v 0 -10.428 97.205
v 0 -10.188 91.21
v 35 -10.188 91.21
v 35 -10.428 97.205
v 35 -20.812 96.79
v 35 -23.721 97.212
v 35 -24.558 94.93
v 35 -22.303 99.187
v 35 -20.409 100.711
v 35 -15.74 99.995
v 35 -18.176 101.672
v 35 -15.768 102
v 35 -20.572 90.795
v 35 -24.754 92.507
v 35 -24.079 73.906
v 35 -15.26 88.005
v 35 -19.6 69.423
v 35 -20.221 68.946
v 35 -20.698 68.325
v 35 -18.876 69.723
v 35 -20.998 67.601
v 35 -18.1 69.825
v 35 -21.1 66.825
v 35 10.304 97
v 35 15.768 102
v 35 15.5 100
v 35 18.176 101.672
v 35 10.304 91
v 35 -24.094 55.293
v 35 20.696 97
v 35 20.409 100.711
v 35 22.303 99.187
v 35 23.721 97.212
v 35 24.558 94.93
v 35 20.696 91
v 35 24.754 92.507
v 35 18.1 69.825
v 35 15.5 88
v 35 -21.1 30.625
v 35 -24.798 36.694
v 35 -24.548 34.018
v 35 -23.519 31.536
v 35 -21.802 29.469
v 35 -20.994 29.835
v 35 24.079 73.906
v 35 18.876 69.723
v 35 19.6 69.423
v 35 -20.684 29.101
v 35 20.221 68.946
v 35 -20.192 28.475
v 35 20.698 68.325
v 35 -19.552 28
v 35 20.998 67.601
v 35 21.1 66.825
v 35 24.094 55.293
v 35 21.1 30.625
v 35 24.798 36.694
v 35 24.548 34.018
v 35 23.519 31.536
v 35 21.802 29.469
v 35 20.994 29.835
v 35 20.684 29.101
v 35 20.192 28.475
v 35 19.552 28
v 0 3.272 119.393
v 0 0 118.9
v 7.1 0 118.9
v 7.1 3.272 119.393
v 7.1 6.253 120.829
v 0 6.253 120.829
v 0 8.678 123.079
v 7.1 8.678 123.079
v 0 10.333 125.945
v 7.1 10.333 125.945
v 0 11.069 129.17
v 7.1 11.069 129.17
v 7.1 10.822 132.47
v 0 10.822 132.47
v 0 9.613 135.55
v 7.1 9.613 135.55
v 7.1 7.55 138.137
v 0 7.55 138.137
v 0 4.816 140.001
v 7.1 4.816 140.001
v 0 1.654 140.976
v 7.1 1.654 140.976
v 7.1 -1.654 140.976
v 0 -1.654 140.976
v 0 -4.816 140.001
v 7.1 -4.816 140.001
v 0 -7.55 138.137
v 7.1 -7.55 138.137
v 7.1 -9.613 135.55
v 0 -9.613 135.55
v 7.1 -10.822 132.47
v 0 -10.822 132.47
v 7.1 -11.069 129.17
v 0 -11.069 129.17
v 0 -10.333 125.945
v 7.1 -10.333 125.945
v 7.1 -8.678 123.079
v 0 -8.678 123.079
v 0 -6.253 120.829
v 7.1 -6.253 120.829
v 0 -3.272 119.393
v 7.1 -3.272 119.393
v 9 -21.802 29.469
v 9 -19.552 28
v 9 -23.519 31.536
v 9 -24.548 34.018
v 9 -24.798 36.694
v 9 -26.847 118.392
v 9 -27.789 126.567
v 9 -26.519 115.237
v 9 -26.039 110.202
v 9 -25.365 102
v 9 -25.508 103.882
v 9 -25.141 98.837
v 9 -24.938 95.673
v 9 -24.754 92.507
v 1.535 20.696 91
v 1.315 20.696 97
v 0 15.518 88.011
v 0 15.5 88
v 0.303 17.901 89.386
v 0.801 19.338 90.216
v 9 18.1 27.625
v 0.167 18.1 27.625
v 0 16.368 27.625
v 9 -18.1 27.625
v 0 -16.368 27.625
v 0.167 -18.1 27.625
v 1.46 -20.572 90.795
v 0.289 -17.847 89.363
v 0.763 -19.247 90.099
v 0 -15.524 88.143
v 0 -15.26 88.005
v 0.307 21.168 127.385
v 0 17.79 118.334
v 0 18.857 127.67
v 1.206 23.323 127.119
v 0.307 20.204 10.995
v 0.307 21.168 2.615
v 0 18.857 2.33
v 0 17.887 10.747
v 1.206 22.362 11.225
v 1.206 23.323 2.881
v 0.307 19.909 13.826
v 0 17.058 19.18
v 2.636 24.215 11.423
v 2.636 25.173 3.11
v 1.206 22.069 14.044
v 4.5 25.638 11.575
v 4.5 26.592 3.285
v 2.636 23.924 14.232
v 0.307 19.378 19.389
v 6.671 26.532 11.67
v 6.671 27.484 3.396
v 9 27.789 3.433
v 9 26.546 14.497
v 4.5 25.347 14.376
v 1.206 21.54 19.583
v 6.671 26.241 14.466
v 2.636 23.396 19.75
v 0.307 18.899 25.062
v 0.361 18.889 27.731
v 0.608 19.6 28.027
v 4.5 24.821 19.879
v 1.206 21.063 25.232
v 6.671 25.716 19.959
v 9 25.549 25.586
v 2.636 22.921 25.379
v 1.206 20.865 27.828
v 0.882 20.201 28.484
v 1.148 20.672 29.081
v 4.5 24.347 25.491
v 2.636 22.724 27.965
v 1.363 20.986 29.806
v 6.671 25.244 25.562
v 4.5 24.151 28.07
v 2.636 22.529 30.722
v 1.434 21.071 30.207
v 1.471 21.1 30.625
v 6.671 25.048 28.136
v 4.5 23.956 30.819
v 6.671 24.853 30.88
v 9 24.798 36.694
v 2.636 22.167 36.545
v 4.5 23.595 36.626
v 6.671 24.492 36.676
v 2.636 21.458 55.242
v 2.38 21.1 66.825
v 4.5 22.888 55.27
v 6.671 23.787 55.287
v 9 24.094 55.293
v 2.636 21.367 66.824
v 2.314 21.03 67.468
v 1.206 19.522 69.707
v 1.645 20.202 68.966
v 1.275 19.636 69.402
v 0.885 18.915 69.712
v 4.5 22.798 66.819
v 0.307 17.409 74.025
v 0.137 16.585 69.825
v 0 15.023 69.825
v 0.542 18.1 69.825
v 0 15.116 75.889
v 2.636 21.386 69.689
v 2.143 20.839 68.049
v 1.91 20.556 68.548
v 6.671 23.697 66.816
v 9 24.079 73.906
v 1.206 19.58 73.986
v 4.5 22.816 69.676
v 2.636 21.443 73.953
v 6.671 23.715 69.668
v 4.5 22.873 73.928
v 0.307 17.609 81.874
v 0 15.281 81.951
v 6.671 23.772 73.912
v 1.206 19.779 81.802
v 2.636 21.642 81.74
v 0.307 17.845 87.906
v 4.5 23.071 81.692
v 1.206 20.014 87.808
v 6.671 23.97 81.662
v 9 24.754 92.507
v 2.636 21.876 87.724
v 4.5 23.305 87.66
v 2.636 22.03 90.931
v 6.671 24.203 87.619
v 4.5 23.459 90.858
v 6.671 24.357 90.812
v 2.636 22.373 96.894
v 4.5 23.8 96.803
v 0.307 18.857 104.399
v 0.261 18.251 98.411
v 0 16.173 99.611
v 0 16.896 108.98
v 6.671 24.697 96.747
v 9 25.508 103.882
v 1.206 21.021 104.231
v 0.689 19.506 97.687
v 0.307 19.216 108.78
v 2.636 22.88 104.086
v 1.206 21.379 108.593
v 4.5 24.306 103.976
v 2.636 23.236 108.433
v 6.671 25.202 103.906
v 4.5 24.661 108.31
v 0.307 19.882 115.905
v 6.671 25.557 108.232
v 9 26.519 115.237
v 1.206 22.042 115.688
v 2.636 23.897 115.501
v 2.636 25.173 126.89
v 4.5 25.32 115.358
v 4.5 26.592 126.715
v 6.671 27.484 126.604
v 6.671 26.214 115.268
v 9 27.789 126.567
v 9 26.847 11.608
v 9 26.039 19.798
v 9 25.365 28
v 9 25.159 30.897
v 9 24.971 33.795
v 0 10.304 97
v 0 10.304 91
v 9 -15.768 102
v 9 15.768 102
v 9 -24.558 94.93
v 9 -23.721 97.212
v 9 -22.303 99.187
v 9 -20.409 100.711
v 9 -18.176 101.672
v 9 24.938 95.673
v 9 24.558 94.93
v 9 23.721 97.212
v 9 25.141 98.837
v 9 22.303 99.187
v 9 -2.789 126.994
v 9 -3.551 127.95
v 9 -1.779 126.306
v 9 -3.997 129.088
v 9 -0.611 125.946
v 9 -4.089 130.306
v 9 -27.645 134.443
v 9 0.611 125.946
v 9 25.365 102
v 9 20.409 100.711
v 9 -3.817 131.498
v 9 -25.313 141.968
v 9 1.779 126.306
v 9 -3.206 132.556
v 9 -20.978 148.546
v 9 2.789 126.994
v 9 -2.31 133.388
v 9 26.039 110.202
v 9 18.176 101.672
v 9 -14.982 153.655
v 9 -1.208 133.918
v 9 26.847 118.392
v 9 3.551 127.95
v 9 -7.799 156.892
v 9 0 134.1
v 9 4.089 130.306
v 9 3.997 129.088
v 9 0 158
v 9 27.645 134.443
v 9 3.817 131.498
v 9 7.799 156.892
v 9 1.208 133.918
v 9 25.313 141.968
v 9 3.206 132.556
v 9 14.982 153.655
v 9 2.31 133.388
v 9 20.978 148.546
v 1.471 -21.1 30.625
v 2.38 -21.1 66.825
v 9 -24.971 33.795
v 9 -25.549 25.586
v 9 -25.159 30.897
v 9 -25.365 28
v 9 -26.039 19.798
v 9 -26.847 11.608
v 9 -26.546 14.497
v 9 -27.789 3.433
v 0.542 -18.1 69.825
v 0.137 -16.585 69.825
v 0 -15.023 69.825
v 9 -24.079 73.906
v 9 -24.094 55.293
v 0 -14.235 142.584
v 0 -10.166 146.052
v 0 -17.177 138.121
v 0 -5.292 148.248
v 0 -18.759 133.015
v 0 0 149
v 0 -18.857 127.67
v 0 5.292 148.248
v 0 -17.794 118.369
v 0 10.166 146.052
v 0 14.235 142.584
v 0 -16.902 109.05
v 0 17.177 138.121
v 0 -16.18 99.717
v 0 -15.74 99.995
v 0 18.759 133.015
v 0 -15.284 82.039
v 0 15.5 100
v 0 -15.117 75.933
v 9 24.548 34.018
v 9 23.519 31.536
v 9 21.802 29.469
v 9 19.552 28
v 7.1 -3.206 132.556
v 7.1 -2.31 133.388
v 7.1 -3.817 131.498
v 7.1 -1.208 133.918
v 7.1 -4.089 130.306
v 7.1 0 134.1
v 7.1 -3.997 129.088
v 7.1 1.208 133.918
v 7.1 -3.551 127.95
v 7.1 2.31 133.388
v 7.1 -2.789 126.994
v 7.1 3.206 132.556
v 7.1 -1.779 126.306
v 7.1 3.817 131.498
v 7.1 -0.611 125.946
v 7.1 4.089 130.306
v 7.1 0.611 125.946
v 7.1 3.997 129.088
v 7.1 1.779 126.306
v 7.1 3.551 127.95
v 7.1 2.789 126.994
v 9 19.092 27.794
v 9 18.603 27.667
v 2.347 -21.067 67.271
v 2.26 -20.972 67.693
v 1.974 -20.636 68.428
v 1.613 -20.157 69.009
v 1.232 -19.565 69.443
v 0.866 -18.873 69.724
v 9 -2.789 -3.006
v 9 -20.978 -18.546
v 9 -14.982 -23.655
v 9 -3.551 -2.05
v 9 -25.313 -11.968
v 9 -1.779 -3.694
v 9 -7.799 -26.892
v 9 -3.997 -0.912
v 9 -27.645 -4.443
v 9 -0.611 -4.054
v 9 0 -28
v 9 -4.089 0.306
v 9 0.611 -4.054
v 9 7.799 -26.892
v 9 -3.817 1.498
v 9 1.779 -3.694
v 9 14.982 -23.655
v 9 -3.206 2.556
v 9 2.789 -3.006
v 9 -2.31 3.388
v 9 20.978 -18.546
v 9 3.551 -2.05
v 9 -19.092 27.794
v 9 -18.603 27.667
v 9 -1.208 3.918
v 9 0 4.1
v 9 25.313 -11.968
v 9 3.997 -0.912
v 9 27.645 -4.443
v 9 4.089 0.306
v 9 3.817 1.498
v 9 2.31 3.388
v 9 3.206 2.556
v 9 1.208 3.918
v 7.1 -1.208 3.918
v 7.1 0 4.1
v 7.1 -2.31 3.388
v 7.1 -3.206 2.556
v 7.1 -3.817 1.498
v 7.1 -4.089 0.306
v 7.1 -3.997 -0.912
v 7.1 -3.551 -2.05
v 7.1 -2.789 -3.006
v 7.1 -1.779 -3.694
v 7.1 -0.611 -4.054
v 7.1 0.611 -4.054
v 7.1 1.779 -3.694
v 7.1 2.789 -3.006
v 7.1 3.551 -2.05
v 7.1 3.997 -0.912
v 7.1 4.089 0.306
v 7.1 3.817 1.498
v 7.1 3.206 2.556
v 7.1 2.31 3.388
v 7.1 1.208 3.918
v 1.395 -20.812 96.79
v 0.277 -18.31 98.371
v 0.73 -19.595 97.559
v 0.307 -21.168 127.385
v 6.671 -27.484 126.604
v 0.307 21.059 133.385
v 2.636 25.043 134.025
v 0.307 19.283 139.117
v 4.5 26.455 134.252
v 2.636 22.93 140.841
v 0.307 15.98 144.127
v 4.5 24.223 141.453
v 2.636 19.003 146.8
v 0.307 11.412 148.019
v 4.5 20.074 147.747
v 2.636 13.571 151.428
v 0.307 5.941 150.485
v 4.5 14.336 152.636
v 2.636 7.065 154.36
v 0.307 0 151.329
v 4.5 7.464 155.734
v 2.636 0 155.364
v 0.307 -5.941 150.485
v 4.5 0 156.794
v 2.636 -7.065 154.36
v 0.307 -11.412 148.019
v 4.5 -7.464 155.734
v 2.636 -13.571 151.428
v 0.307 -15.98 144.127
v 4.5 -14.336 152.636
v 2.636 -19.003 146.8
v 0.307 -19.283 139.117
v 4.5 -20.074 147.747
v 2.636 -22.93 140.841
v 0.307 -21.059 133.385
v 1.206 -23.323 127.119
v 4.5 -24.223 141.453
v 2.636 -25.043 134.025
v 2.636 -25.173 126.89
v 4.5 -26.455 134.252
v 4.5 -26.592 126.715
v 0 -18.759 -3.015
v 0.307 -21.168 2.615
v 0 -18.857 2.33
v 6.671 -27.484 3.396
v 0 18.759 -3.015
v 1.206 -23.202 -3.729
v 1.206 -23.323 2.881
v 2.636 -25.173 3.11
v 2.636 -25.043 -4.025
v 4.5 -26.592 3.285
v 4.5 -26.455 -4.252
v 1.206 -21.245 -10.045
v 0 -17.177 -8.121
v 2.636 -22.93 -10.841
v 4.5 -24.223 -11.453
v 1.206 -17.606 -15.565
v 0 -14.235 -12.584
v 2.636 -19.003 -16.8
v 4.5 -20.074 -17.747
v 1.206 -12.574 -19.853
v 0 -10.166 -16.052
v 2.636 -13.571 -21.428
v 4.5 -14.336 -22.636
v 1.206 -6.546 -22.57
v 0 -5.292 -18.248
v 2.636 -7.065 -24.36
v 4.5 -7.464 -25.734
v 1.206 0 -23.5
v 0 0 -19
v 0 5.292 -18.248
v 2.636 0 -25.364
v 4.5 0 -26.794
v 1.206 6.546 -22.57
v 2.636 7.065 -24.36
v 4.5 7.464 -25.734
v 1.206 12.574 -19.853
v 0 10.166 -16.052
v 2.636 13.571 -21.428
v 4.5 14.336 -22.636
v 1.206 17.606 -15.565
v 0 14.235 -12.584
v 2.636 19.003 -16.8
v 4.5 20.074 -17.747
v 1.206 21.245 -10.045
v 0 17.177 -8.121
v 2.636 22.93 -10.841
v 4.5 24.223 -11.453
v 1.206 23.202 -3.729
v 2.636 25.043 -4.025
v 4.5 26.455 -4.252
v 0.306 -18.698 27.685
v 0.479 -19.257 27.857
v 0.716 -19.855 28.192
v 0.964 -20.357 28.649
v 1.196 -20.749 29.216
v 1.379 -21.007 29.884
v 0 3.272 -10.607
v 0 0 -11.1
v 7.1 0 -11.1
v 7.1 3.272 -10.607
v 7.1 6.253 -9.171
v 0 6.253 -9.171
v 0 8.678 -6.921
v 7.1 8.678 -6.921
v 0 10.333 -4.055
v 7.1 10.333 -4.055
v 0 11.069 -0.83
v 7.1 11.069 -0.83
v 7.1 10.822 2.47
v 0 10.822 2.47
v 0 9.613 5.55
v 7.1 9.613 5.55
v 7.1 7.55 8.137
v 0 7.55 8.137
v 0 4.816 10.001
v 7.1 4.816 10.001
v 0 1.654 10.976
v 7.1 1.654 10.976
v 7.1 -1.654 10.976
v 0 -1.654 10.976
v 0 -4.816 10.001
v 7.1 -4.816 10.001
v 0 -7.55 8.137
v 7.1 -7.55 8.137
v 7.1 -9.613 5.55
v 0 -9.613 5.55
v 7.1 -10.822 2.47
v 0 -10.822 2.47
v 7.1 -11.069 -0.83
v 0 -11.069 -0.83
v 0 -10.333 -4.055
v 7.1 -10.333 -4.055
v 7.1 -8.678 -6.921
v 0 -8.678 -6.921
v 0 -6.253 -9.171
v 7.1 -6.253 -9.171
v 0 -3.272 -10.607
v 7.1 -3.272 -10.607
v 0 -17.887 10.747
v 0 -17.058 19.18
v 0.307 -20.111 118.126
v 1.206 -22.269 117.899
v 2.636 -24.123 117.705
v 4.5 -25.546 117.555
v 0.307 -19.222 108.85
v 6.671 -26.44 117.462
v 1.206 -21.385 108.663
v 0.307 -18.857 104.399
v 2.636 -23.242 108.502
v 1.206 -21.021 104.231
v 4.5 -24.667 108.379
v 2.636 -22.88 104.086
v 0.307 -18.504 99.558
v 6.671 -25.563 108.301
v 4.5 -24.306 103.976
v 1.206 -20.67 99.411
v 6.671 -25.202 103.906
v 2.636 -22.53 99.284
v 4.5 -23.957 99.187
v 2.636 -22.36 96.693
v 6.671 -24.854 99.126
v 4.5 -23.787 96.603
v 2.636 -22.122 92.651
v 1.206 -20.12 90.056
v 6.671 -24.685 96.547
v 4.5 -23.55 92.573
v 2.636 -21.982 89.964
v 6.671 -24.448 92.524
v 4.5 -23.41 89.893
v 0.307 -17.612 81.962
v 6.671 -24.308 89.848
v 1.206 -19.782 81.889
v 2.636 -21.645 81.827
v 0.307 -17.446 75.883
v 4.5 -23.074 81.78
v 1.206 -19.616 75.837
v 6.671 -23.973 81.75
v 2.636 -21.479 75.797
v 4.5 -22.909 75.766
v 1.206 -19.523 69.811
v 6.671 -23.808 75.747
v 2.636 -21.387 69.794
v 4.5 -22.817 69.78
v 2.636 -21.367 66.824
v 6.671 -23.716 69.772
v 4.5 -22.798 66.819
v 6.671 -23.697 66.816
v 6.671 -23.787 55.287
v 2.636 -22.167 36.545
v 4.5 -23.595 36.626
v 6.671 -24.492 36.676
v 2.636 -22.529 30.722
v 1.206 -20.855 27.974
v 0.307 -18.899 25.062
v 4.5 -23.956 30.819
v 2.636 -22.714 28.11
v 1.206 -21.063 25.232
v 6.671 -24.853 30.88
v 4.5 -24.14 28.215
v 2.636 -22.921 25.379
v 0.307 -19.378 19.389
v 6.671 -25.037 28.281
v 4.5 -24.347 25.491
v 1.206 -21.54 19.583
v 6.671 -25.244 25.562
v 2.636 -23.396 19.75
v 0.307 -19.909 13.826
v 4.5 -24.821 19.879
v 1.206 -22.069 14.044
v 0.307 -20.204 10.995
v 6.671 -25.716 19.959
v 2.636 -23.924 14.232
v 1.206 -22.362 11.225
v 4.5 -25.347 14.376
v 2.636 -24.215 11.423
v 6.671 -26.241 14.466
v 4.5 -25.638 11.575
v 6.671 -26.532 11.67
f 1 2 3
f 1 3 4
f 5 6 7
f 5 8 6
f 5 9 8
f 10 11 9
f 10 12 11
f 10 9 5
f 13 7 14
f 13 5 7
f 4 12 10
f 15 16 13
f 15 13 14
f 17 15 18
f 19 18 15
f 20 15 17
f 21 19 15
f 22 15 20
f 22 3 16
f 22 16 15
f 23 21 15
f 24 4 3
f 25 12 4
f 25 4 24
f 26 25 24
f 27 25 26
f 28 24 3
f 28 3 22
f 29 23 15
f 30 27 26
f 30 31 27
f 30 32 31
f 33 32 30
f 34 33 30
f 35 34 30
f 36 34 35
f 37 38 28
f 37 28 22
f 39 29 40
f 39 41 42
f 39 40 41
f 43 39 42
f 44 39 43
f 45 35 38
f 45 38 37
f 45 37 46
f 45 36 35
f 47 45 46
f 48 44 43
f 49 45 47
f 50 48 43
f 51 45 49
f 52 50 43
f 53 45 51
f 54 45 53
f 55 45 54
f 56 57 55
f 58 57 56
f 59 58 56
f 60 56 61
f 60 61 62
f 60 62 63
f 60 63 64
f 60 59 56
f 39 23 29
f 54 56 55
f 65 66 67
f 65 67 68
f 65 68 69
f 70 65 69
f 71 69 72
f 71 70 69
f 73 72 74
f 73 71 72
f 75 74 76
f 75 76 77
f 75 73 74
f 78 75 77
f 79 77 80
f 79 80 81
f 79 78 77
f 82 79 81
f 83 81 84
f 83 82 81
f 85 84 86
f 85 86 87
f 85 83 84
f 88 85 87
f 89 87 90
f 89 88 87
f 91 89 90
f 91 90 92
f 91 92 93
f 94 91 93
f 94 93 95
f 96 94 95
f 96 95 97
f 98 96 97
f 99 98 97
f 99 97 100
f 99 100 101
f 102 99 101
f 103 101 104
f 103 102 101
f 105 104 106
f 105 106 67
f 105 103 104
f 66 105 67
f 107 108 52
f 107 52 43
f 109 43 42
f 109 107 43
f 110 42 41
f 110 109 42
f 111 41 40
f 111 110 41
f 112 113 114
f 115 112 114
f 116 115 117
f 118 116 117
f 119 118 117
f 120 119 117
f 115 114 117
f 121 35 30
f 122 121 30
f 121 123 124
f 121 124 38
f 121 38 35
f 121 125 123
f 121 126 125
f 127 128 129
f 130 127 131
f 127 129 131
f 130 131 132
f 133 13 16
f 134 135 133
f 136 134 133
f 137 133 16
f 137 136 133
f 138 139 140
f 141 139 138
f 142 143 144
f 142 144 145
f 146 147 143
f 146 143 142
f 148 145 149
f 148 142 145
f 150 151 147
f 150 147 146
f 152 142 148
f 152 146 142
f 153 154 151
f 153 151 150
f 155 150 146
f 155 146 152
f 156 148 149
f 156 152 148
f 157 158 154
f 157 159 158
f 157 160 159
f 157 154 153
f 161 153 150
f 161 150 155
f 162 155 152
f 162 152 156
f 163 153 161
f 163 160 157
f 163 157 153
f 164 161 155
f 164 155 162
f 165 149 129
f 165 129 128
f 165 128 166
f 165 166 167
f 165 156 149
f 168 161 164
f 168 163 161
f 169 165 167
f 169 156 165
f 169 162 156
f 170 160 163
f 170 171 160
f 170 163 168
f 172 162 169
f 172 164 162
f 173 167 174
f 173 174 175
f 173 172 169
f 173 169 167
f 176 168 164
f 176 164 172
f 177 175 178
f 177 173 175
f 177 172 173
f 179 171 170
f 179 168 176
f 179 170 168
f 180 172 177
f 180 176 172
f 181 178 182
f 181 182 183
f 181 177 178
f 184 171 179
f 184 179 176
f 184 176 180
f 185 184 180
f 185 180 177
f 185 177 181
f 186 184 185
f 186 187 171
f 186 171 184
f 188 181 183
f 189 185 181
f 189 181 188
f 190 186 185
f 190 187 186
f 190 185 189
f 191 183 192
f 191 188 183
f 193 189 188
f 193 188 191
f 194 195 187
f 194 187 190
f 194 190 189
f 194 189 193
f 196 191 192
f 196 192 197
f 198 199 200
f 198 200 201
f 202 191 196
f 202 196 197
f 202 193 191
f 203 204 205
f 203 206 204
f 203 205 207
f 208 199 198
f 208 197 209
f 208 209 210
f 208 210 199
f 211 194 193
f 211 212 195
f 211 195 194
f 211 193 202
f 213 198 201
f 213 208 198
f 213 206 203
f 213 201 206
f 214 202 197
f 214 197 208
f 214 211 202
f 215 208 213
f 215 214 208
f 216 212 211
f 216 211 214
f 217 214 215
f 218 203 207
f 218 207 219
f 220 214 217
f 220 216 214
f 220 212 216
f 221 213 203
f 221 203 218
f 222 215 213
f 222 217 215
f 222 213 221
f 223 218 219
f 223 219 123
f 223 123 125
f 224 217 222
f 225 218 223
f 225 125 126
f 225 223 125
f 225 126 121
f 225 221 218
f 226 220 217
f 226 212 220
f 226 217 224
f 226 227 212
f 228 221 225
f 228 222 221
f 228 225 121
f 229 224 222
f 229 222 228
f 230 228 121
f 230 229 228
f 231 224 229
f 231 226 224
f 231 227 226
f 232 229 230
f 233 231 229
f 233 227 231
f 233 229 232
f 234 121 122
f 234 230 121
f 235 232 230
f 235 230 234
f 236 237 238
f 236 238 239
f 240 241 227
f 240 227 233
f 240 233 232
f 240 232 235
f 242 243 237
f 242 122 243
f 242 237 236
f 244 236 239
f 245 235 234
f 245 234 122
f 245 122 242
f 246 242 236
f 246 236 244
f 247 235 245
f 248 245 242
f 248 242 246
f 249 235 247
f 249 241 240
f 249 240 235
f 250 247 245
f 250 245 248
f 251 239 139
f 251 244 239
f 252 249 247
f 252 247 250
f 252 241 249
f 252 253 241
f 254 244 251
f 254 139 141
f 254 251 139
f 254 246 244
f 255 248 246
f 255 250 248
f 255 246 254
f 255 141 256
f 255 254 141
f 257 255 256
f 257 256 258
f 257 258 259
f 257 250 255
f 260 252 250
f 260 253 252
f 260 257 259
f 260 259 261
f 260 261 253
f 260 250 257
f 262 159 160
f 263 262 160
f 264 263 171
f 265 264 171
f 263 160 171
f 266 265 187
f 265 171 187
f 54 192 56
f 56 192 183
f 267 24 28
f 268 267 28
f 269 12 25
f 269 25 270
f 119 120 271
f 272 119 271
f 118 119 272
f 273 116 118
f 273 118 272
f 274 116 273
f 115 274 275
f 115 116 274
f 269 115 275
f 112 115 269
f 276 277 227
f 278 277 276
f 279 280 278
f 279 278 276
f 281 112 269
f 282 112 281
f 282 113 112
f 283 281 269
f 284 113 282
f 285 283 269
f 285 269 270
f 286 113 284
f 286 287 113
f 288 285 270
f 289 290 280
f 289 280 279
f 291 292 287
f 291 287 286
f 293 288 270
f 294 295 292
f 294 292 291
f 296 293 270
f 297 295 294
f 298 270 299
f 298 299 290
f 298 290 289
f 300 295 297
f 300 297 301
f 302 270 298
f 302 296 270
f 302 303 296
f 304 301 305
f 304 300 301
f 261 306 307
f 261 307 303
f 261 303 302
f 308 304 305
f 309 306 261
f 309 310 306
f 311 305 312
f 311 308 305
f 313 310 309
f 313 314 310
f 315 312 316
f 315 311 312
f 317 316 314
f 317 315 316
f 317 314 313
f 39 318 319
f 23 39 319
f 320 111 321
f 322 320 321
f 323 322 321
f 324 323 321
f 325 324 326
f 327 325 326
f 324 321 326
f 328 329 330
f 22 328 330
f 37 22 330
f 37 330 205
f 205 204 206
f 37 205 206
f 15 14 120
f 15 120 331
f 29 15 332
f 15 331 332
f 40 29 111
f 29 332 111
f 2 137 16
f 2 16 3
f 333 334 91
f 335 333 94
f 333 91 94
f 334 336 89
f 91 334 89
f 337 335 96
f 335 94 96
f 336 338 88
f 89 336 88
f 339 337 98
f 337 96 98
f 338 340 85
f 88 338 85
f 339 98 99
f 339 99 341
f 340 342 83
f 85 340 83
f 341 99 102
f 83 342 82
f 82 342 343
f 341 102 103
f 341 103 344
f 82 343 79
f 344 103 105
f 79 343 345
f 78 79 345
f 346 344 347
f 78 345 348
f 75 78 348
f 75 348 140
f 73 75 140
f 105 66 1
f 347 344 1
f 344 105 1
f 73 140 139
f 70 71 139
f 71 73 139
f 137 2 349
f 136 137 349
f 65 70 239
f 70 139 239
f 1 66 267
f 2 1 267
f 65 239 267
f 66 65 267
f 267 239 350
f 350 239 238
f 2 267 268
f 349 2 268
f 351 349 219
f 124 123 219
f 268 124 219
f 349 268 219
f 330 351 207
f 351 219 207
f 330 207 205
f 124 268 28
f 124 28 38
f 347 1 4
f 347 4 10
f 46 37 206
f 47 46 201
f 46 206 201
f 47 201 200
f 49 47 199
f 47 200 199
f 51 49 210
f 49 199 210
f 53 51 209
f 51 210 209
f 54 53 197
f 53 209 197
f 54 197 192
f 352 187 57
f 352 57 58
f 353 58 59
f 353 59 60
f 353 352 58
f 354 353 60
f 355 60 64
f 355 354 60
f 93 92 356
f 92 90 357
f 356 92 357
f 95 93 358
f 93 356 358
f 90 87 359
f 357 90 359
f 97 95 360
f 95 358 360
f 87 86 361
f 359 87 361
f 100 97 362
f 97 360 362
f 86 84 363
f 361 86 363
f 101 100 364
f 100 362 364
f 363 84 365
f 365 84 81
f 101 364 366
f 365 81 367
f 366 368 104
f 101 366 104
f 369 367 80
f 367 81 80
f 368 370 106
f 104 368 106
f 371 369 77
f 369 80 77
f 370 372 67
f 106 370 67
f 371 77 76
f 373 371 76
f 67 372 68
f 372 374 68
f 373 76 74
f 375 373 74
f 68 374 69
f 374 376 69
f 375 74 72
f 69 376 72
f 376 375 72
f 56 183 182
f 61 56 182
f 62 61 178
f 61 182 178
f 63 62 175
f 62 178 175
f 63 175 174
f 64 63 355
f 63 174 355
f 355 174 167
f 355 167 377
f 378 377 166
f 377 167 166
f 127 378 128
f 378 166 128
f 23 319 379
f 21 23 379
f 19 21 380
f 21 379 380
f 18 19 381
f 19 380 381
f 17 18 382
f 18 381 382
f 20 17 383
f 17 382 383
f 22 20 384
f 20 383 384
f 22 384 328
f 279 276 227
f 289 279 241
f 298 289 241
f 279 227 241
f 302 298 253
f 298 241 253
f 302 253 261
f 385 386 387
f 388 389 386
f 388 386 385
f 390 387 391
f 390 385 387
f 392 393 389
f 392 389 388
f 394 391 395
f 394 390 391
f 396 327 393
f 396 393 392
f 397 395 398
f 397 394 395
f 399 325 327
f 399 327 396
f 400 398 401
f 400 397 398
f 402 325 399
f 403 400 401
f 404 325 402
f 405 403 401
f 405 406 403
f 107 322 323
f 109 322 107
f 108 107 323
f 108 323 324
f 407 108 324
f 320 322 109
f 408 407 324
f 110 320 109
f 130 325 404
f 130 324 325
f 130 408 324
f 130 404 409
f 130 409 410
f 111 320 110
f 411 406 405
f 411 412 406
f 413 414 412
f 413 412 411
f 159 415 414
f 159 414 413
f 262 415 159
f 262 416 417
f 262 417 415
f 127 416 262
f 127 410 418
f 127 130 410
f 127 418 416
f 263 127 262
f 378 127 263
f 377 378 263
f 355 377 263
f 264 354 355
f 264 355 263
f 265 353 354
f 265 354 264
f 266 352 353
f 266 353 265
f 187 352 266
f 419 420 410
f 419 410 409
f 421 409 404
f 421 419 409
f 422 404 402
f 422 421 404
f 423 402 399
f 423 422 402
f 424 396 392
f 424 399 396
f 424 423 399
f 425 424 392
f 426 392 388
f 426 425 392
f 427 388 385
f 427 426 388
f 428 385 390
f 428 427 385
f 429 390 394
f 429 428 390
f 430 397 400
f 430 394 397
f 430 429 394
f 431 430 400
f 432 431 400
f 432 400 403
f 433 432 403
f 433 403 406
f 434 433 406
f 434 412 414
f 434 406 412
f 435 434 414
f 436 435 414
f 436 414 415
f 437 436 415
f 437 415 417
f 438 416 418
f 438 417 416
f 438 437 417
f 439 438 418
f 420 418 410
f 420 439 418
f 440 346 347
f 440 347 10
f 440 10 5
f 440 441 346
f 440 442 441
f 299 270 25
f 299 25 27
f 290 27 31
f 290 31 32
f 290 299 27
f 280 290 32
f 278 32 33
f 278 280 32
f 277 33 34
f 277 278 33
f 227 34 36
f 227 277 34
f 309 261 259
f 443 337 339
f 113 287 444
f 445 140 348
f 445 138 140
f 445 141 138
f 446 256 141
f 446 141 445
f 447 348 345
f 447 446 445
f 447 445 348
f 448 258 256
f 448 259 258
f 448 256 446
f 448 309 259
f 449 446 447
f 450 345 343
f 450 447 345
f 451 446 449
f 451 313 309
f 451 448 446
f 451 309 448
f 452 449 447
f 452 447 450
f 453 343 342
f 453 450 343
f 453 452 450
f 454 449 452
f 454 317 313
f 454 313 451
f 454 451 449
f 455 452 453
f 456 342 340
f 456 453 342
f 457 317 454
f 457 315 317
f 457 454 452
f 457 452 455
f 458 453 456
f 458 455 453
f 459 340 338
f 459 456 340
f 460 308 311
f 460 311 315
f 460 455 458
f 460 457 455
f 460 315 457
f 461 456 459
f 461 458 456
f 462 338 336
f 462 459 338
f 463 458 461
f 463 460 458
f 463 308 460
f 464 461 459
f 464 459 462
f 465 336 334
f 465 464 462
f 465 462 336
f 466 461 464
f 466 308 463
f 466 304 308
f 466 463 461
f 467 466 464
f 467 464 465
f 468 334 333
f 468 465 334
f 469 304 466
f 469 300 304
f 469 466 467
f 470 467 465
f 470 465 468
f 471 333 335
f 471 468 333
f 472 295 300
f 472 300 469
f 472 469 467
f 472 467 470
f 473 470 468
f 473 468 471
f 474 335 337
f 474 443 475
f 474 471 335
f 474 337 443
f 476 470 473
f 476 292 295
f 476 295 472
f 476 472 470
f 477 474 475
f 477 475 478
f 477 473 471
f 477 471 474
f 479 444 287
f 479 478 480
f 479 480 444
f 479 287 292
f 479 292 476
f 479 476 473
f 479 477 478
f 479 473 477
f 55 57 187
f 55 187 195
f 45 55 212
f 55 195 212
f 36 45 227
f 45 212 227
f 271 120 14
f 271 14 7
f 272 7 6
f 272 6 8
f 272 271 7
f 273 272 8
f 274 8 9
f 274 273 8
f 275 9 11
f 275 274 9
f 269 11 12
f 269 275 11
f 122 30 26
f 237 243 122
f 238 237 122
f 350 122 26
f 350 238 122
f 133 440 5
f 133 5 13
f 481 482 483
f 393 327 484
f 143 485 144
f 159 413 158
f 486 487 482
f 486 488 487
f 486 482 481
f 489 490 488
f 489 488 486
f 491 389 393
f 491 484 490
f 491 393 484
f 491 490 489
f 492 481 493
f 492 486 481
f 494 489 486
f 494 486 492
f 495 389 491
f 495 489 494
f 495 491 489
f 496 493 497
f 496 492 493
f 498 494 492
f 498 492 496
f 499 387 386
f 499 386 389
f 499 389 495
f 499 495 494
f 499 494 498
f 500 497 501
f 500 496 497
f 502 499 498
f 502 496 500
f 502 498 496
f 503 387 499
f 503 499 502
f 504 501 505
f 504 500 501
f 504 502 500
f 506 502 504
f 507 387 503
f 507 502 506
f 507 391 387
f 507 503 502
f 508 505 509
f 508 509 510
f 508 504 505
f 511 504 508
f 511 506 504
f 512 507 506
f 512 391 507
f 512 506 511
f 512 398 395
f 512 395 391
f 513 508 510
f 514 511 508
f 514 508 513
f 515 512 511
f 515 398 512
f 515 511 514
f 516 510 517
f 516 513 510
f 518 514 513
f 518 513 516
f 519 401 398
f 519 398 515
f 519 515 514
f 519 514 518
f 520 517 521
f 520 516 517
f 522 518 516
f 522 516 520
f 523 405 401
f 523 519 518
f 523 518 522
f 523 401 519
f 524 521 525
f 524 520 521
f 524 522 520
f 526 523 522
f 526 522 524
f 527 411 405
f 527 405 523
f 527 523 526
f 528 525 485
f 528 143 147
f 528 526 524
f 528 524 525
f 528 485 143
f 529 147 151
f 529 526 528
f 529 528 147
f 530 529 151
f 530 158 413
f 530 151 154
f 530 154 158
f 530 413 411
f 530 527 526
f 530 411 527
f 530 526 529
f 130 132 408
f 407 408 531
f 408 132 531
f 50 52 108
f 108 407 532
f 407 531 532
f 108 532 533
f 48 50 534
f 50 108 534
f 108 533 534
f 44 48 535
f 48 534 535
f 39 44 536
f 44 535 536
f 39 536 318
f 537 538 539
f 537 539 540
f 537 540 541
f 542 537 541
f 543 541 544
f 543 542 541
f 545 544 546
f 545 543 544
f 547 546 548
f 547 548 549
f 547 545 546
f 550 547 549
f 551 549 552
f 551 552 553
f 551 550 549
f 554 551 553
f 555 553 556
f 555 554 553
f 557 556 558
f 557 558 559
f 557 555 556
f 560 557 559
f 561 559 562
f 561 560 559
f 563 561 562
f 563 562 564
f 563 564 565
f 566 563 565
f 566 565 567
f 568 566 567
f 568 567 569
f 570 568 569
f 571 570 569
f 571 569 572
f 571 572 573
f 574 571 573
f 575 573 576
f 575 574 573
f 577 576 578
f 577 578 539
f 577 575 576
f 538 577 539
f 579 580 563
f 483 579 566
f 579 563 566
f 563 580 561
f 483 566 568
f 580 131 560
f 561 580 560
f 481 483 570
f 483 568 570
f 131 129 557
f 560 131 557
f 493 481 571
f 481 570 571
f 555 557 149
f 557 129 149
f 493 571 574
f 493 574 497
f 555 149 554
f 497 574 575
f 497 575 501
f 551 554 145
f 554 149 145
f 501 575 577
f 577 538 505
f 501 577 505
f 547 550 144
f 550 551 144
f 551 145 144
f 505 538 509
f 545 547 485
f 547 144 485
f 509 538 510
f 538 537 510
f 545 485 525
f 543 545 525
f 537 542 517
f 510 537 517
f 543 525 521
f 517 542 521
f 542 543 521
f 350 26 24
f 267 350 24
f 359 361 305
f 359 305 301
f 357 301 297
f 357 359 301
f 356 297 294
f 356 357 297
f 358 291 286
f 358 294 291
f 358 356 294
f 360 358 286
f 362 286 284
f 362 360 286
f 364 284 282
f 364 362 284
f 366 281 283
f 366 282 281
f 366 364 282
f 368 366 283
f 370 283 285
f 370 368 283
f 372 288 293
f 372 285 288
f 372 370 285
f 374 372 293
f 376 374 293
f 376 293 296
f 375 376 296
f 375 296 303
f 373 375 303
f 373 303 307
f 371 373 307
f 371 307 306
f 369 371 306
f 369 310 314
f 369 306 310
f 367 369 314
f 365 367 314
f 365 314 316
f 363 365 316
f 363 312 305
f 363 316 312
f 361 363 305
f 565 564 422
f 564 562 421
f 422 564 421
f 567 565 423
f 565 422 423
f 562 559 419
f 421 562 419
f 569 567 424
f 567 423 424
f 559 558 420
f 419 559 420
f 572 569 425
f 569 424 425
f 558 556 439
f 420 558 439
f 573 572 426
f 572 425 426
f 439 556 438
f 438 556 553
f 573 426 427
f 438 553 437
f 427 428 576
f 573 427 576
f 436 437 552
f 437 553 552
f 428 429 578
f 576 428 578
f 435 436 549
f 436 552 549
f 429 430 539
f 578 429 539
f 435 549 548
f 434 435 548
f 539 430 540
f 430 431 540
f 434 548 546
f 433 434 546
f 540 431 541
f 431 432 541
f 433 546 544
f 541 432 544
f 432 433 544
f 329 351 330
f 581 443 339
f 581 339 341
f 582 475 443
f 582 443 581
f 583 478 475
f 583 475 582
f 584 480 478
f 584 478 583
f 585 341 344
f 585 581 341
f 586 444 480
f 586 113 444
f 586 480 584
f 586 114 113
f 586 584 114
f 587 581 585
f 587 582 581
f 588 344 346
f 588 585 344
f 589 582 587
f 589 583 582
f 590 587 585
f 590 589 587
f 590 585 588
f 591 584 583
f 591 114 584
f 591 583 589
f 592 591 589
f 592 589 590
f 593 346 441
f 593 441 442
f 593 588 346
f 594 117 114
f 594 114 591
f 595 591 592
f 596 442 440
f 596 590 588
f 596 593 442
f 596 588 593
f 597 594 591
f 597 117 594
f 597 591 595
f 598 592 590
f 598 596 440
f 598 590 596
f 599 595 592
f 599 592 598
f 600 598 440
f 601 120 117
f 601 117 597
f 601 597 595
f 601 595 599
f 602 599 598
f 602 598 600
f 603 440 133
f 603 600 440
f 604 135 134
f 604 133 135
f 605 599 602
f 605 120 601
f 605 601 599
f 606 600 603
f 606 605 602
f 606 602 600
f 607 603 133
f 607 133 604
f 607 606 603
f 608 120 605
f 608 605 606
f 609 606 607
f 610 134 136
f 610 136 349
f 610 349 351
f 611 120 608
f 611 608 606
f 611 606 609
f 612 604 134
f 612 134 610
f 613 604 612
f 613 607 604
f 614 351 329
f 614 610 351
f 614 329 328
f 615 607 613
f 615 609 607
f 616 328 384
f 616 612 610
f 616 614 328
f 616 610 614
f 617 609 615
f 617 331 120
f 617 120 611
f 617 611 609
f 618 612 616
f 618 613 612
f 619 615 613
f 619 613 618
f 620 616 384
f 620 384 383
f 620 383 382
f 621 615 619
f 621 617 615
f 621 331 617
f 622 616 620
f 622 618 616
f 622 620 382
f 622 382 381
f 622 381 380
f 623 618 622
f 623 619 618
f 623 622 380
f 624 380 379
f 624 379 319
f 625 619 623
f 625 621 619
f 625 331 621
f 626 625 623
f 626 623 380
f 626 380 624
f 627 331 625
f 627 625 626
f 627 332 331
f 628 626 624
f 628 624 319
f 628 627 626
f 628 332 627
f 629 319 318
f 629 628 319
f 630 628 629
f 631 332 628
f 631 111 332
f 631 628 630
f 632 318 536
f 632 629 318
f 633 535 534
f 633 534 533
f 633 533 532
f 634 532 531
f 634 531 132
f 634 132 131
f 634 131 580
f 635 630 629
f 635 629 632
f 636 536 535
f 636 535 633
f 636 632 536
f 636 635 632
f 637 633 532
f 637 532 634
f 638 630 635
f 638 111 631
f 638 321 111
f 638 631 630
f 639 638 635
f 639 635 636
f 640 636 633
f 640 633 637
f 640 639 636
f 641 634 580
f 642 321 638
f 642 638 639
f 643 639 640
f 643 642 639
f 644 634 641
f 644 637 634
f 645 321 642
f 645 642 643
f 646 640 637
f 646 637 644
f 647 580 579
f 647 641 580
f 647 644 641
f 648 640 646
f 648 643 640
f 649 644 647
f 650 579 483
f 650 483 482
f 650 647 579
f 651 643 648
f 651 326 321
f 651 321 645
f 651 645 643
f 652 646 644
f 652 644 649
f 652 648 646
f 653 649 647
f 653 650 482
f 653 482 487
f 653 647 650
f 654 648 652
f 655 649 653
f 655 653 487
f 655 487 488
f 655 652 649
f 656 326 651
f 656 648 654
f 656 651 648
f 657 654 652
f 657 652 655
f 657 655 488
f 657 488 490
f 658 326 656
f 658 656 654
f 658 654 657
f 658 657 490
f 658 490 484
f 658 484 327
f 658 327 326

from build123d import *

# Parameters (mm, degrees)
BOSS_EXTRUDE1_DEPTH     = 35
CUT_EXTRUDE1_DEPTH      = 165.23458831805192
CUT_EXTRUDE1_DEPTH_BACK = 165.23458831805192
CUT_EXTRUDE2_DEPTH      = 165.23458831805192
CUT_EXTRUDE3_DEPTH      = 165.23458831805192
CUT_EXTRUDE4_REACH      = 166.235
SKETCH7_R               = 4.1
SKETCH7_R_2             = 4.099999999999986
SKETCH7_3_R             = 11.1
CUT_EXTRUDE5_DEPTH      = 7.1
FILLET1_R               = 9
FILLET2_START           = 9
FILLET2_DEPTH           = 26


with BuildPart() as part:
    # Sketch1 → Boss-Extrude1 (new body)
    with BuildSketch(Plane(origin=(0, 0, 0), x_dir=(0, 0, -1), z_dir=(1, 0, 0))):
        with BuildLine():
            ThreePointArc((-3.4331525583588727, 27.788729073331762), (-20.97770568525129, 18.545507924642443), (-28, 3.43e-15))
            Line((-28, 0), (28, 0))
            ThreePointArc((28, 0), (18.545507924642447, 20.977705685251287), (-3.4331525583588727, 27.788729073331762))
        make_face()
        with BuildLine():
            Line((28, 0), (-28, 0))
            ThreePointArc((-28, 3.43e-15), (-20.977705685251298, -18.545507924642436), (-3.433152558358892, -27.78872907333176))
            ThreePointArc((-3.433152558358892, -27.78872907333176), (18.545507924642436, -20.977705685251298), (28, -6.86e-15))
        make_face()
        with BuildLine():
            ThreePointArc((-126.56684744164114, 27.788729073331766), (-109.02229431474872, 18.54550792464245), (-102, 0))
            Line((-102, 0), (-28, 0))
            ThreePointArc((-28, 3.43e-15), (-20.97770568525129, 18.545507924642443), (-3.4331525583588727, 27.788729073331762))
            ThreePointArc((-3.433152558358863, 27.788729073331695), (-65, 23.999999999999602), (-126.56684744164116, 27.788729073331638))
        make_face()
        with BuildLine():
            Line((-28, 0), (-102, 0))
            ThreePointArc((-102, -6.86e-15), (-109.0222943147487, -18.545507924642447), (-126.56684744164114, -27.788729073331766))
            ThreePointArc((-126.56684744164116, -27.788729073331638), (-65, -23.999999999999602), (-3.433152558358863, -27.788729073331695))
            ThreePointArc((-3.433152558358892, -27.78872907333176), (-20.977705685251298, -18.545507924642436), (-28, 3.43e-15))
        make_face()
        with BuildLine():
            ThreePointArc((-126.56684744164114, 27.788729073331766), (-148.54550792464244, 20.977705685251287), (-158, 3.43e-15))
            Line((-158, 0), (-102, 0))
            ThreePointArc((-102, 0), (-109.02229431474872, 18.54550792464245), (-126.56684744164114, 27.788729073331766))
        make_face()
        with BuildLine():
            Line((-102, 0), (-158, 0))
            ThreePointArc((-158, 3.43e-15), (-148.54550792464244, -20.97770568525128), (-126.56684744164114, -27.788729073331766))
            ThreePointArc((-126.56684744164114, -27.788729073331766), (-109.0222943147487, -18.545507924642447), (-102, -6.86e-15))
        make_face()
    extrude(amount=BOSS_EXTRUDE1_DEPTH)

    # Sketch4 → Cut-Extrude1 (cut, two sides: drawn at the far end of the back side and taken through both)
    with BuildSketch(Plane(origin=(0, 0, 0), x_dir=(1, 0, 0), z_dir=(0, 1, 0)).offset(-CUT_EXTRUDE1_DEPTH_BACK)):
        Polygon((8.999999999999998, 27.999999999999996), (61, 27.999999999999996), (61, -28.000000000000004), (9.000000000000005, -28.000000000000004), align=None)
        Polygon((60.999999999999986, -157.99999999999997), (60.99999999999993, -101.99999999999999), (8.999999999999956, -101.99999999999999), (8.99999999999997, -157.99999999999997), align=None)
    extrude(amount=CUT_EXTRUDE1_DEPTH + CUT_EXTRUDE1_DEPTH_BACK, mode=Mode.SUBTRACT)

    # Sketch6 → Cut-Extrude2 (cut, through all)
    with BuildSketch(Plane(origin=(0, 0, 0), x_dir=(0, 0, -1), z_dir=(1, 0, 0))):
        with BuildLine():
            Line((-30.624999999999996, -21.1), (-66.82499999999999, -21.100000000000005))
            ThreePointArc((-66.82499999999999, -21.100000000000005), (-68.94632034355963, -20.221320343559647), (-69.825, -18.100000000000005))
            Line((-69.825, -18.100000000000005), (-69.825, 18.099999999999998))
            ThreePointArc((-69.825, 18.099999999999998), (-68.94632034355963, 20.22132034355964), (-66.82499999999999, 21.099999999999998))
            Line((-66.82499999999999, 21.099999999999998), (-30.624999999999996, 21.1))
            ThreePointArc((-30.624999999999996, 21.1), (-28.503679656440355, 20.221320343559643), (-27.624999999999996, 18.1))
            Line((-27.624999999999996, 18.1), (-27.624999999999996, -18.1))
            ThreePointArc((-27.624999999999996, -18.1), (-28.503679656440355, -20.221320343559643), (-30.624999999999996, -21.1))
        make_face()
    extrude(amount=CUT_EXTRUDE2_DEPTH, mode=Mode.SUBTRACT)

    # Sketch8 → Cut-Extrude3 (cut, through all)
    with BuildSketch(Plane(origin=(0, 0, 0), x_dir=(0, 0, -1), z_dir=(1, 0, 0))):
        Polygon((-99.99999999999986, 15.499999999999991), (-96.9999999999999, 10.303847577293476), (-91.00000000000006, 10.303847577293476), (-88.00000000000014, 15.500000000000032), (-91.00000000000013, 20.696152422706533), (-96.99999999999999, 20.69615242270647), align=None)
        Polygon((-99.99521646144645, -15.739540352344857), (-96.7901602003611, -20.811779932971724), (-90.79494373891465, -20.57223958062687), (-88.00478353855354, -15.26045964765515), (-91.20983979963889, -10.188220067028302), (-97.20505626108536, -10.427760419373156), align=None)
    extrude(amount=CUT_EXTRUDE3_DEPTH, mode=Mode.SUBTRACT)

    # Sketch7 → Cut-Extrude4 (cut, up to next)
    with BuildSketch(Plane(origin=(0, 0, 0), x_dir=(0, 0, -1), z_dir=(1, 0, 0)), mode=Mode.PRIVATE) as cut_extrude4_sk1:
        with Locations(Location((0, 0, 0), (0, 0, 180))):
            Circle(SKETCH7_R)
    cut_extrude4_tool1 = extrude(cut_extrude4_sk1.sketch, amount=CUT_EXTRUDE4_REACH, mode=Mode.PRIVATE) & part.part
    # Sketch7 → Cut-Extrude4 (cut, up to next)
    with BuildSketch(Plane(origin=(0, 0, 0), x_dir=(0, 0, -1), z_dir=(1, 0, 0)), mode=Mode.PRIVATE) as cut_extrude4_sk2:
        with Locations(Location((-130, 0, 0), (0, 0, 180))):
            Circle(SKETCH7_R_2)
    cut_extrude4_tool2 = extrude(cut_extrude4_sk2.sketch, amount=CUT_EXTRUDE4_REACH, mode=Mode.PRIVATE) & part.part
    add(cut_extrude4_tool1.solids().sort_by_distance((0, 0, 0))[0], mode=Mode.SUBTRACT)
    add(cut_extrude4_tool2.solids().sort_by_distance((0, 0, 130))[0], mode=Mode.SUBTRACT)

    # Sketch7<3> → Cut-Extrude5 (cut)
    with BuildSketch(Plane(origin=(0, 0, 0), x_dir=(0, 0, -1), z_dir=(1, 0, 0))):
        Circle(SKETCH7_3_R)
        with Locations((-130, 0)):
            Circle(SKETCH7_3_R)
    extrude(amount=CUT_EXTRUDE5_DEPTH, mode=Mode.SUBTRACT)

    # Fillet1
    # the kernel refuses this fillet: 9 mm, written as the material it takes off along each edge
    with BuildSketch(Plane(origin=(0, -7.11e-15, 130), x_dir=(0, 0.9924546097618487, -0.12261259136995861), z_dir=(0, -0.12261259136995861, -0.9924546097618487))) as fillet1_piece_1:
        with BuildLine():
            CenterArc((28 - FILLET1_R, FILLET1_R), FILLET1_R, 270, 89.99999999999999)
            Line((28, FILLET1_R), (28, 0))
            Line((28, 0), (28 - FILLET1_R, 0))
        make_face()
    revolve(axis=Axis((0, -7.11e-15, 130), (1, 0, 0)), revolution_arc=194.0858135076888, mode=Mode.SUBTRACT)
    with BuildSketch(Plane(origin=(0, 526.1249999999663, 65.00000000000024), x_dir=(0, -0.9924546097618476, -0.12261259136996856), z_dir=(0, 0.12261259136996856, -0.9924546097618476))) as fillet1_piece_2:
        with BuildLine():
            CenterArc((502.12499999996675 + FILLET1_R, -FILLET1_R), FILLET1_R, 90, 90)
            Line((502.12499999996675 + FILLET1_R, 1.78e-15), (502.12499999996675, 0))
            Line((502.12499999996675, 0), (502.12499999996675, -FILLET1_R))
        make_face()
    revolve(axis=Axis((0, 526.1249999999663, 65.00000000000024), (-1, 0, 0)), revolution_arc=14.085813507689899, mode=Mode.SUBTRACT)
    with BuildSketch(Plane(origin=(0, 1.78e-15, -1.78e-15), x_dir=(0, -0.9924546097618486, 0.12261259136995943), z_dir=(0, 0.12261259136995943, 0.9924546097618486))) as fillet1_piece_3:
        with BuildLine():
            CenterArc((28 - FILLET1_R, FILLET1_R), FILLET1_R, 270, 90)
            Line((27.999999999999996, FILLET1_R), (28, 0))
            Line((28, 0), (28 - FILLET1_R, 0))
        make_face()
    revolve(axis=Axis((0, 1.78e-15, -1.78e-15), (1, 0, 0)), revolution_arc=194.0858135076889, mode=Mode.SUBTRACT)
    with BuildSketch(Plane(origin=(0, -526.1249999999588, 65.00000000000026), x_dir=(0, 0.9924546097618475, 0.12261259136996942), z_dir=(0, -0.12261259136996942, 0.9924546097618475))) as fillet1_piece_4:
        with BuildLine():
            CenterArc((502.1249999999594 + FILLET1_R, -FILLET1_R), FILLET1_R, 90, 90)
            Line((502.1249999999594 + FILLET1_R, 1.78e-15), (502.1249999999594, 0))
            Line((502.1249999999594, 0), (502.1249999999594, -FILLET1_R))
        make_face()
    revolve(axis=Axis((0, -526.1249999999588, 65.00000000000026), (-1, 0, 0)), revolution_arc=14.085813507690109, mode=Mode.SUBTRACT)

    # Fillet2: read off the stored shape, not the designer's step
    # Fillet2 outline → Fillet2 (cut)
    with BuildSketch(Plane.YZ.offset(FILLET2_START)):
        with BuildLine():
            ThreePointArc((25.365061881, 28), (25.062921918, 32.34560469), (24.798492486, 36.693666988))
            ThreePointArc((24.798492486, 36.693666988), (23.518514891, 31.536360045), (19.552368755, 28))
            Line((19.552368755, 28), (25.365061881, 28))
        make_face()
        with BuildLine():
            Line((25.365061881, 102), (15.767511934, 102))
            ThreePointArc((15.767511934, 102), (22.303461396, 99.187193599), (24.753997417, 92.506969919))
            ThreePointArc((24.753997417, 92.506969919), (25.037048655, 97.254932057), (25.365061881, 102))
        make_face()
        with BuildLine():
            ThreePointArc((-25.365061881, 102), (-25.037048655, 97.254932057), (-24.753997417, 92.506969919))
            ThreePointArc((-24.753997417, 92.506969919), (-22.303461396, 99.187193599), (-15.767511934, 102))
            Line((-15.767511934, 102), (-25.365061881, 102))
        make_face()
        with BuildLine():
            ThreePointArc((-19.552368755, 28), (-23.518514891, 31.536360045), (-24.798492486, 36.693666988))
            ThreePointArc((-24.798492486, 36.693666988), (-25.062921918, 32.34560469), (-25.365061881, 28))
            Line((-25.365061881, 28), (-19.552368755, 28))
        make_face()
    extrude(amount=FILLET2_DEPTH, mode=Mode.SUBTRACT)


solid = part.part
